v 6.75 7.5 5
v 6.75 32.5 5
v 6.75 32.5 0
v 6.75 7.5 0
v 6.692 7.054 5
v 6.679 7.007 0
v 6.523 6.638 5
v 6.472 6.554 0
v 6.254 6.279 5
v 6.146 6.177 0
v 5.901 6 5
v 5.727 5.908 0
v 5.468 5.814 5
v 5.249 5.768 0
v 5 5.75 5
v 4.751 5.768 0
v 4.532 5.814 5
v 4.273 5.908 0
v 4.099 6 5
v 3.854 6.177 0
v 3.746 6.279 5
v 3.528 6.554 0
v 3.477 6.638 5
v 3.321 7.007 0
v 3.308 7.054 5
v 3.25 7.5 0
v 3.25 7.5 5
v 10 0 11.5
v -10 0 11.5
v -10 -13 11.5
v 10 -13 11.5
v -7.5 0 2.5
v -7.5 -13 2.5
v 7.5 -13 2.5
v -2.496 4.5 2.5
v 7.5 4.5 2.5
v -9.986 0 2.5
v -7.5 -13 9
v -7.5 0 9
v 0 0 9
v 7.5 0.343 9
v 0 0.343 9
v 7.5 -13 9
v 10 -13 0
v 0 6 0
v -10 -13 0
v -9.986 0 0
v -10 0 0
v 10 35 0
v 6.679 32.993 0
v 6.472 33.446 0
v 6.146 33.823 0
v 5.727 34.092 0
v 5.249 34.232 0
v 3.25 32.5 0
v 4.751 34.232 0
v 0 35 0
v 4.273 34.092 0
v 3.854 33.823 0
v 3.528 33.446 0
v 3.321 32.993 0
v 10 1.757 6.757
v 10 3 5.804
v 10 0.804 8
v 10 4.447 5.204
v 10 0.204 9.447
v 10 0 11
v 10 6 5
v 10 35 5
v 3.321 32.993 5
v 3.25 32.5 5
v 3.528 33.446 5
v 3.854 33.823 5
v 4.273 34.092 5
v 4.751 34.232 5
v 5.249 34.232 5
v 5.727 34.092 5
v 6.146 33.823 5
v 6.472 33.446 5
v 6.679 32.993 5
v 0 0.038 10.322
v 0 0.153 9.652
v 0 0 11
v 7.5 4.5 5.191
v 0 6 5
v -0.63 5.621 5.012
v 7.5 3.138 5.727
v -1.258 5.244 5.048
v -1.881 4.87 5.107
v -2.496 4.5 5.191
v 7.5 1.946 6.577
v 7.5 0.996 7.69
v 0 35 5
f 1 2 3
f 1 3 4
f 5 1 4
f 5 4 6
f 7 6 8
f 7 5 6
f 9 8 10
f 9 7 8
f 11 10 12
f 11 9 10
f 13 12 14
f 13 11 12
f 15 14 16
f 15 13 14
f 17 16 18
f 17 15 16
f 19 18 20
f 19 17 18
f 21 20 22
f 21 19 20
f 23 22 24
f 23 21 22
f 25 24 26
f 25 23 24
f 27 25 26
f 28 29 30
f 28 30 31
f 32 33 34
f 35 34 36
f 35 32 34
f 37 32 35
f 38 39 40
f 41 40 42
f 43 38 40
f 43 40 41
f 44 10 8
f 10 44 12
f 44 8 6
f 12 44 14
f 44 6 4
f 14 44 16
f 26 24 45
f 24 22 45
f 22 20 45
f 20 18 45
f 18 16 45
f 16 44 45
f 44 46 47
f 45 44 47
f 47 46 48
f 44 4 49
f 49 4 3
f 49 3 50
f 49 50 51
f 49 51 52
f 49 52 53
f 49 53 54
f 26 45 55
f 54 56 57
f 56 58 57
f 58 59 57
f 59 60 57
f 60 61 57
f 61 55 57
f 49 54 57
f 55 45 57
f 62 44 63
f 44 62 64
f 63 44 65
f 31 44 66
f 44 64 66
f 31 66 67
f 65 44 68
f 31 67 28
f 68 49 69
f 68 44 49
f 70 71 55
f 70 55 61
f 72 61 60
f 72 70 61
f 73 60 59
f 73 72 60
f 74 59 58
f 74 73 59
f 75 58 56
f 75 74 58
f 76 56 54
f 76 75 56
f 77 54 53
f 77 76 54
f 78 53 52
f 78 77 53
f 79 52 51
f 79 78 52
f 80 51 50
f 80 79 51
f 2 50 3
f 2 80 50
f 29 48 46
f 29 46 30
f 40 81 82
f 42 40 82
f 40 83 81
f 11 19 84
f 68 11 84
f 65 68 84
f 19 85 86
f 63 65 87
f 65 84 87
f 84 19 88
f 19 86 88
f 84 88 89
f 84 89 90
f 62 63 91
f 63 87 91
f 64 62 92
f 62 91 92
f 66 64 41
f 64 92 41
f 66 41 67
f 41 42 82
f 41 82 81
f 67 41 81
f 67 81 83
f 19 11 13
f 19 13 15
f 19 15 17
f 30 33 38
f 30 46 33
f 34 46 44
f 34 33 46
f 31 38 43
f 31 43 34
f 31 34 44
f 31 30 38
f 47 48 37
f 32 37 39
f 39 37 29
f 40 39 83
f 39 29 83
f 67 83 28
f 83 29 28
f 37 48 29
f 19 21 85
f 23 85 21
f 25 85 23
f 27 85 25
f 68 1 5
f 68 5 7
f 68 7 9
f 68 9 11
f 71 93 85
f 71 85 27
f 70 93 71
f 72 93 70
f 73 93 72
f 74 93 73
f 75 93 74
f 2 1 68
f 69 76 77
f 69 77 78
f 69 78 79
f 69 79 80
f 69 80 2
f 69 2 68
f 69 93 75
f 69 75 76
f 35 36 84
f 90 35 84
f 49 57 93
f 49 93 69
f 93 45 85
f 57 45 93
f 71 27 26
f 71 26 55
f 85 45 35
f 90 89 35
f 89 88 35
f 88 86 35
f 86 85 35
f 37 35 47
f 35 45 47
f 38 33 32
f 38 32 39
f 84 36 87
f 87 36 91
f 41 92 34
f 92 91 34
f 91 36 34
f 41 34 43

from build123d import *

# Parameters (mm, degrees)
SKETCH1_W           = 10
SKETCH1_H           = 35
BOSS_EXTRUDE1_DEPTH = 5
SKETCH9_W           = 20
SKETCH9_H           = 11.5
BOSS_EXTRUDE3_DEPTH = 13
FILLET1_R           = 6
SKETCH10_W          = 15
SKETCH10_H          = 6.5
CUT_EXTRUDE4_DEPTH  = 17.5
CUT_EXTRUDE2_DEPTH  = 10
CHAMFER2_SIZE       = 6
CHAMFER2_SIZE_2     = 9.985676894


with BuildPart() as part:
    # Sketch1 → Boss-Extrude1 (new body)
    with BuildSketch(Plane.XY):
        with Locations((5, 17.5)):
            Rectangle(SKETCH1_W, SKETCH1_H)
    extrude(amount=BOSS_EXTRUDE1_DEPTH)

    # Sketch9 → Boss-Extrude3 (add)
    with BuildSketch(Plane.XZ):
        with Locations((0, 5.75)):
            Rectangle(SKETCH9_W, SKETCH9_H)
    extrude(amount=BOSS_EXTRUDE3_DEPTH)

    # Fillet1
    fillet1_edges = [part.edges().sort_by_distance(p)[0] for p in [
        (5, 0, 5),
    ]]
    fillet(fillet1_edges, radius=FILLET1_R)

    # Sketch10 → Cut-Extrude4 (cut)
    with BuildSketch(Plane.XZ.offset(13)):
        with Locations((0, 5.75)):
            Rectangle(SKETCH10_W, SKETCH10_H)
    extrude(amount=-CUT_EXTRUDE4_DEPTH, mode=Mode.SUBTRACT)

    # Sketch4 → Cut-Extrude2 (cut)
    with BuildSketch(Plane.XY.offset(5)):
        with BuildLine():
            Line((6.75, 32.5), (6.75, 7.5))
            ThreePointArc((6.75, 7.5), (5, 5.75), (3.25, 7.5))
            Line((3.25, 7.5), (3.25, 32.5))
            ThreePointArc((3.25, 32.5), (5, 34.25), (6.75, 32.5))
        make_face()
    extrude(amount=-CUT_EXTRUDE2_DEPTH, mode=Mode.SUBTRACT)

    # Chamfer2
    # the kernel refuses this chamfer: 9.985676894, 6 mm, written as the material it adds along each edge
    with BuildSketch(Plane(origin=(0, 0, 0), x_dir=(0.055087232083824676, 0.9984815455787568, 0), z_dir=(0, 0, 1))) as chamfer2_piece_1:
        Polygon((CHAMFER2_SIZE * 0.998481545579, CHAMFER2_SIZE * 0.0550872320838), (-CHAMFER2_SIZE_2 * 0.0550872320844, CHAMFER2_SIZE_2 * 0.998481545589), (0, 0), align=None)
    extrude(amount=2.5)
    with BuildSketch(Plane(origin=(0, 0, 0), x_dir=(0.055087232083824676, 0.9984815455787568, 0), z_dir=(0, 0, 1))) as chamfer2_piece_2_section:
        Polygon((CHAMFER2_SIZE * 0.998481545579, CHAMFER2_SIZE * 0.0550872320838), (-CHAMFER2_SIZE_2 * 0.0550872320844, CHAMFER2_SIZE_2 * 0.998481545589), (0, 0), align=None)
    chamfer2_piece_2 = extrude(amount=28.325253365, mode=Mode.PRIVATE)
    chamfer2_piece_2 = chamfer2_piece_2 - Plane(origin=(-0.832139741, 6, 11), x_dir=(0, 0, -1), z_dir=(-1, 0, 0)) * Cylinder(6, 97, mode=Mode.PRIVATE)
    chamfer2_piece_2 = split(chamfer2_piece_2, bisect_by=Plane(origin=(-0.832139741, 4.5, 3.75), z_dir=(0, 1, 0)), keep=Keep.TOP, mode=Mode.PRIVATE)
    chamfer2_piece_2 = split(chamfer2_piece_2, bisect_by=Plane(origin=(-0.832139741, 5, 11.5), z_dir=(0, 0, -1)), keep=Keep.TOP, mode=Mode.PRIVATE)
    add(chamfer2_piece_2)


solid = part.part
